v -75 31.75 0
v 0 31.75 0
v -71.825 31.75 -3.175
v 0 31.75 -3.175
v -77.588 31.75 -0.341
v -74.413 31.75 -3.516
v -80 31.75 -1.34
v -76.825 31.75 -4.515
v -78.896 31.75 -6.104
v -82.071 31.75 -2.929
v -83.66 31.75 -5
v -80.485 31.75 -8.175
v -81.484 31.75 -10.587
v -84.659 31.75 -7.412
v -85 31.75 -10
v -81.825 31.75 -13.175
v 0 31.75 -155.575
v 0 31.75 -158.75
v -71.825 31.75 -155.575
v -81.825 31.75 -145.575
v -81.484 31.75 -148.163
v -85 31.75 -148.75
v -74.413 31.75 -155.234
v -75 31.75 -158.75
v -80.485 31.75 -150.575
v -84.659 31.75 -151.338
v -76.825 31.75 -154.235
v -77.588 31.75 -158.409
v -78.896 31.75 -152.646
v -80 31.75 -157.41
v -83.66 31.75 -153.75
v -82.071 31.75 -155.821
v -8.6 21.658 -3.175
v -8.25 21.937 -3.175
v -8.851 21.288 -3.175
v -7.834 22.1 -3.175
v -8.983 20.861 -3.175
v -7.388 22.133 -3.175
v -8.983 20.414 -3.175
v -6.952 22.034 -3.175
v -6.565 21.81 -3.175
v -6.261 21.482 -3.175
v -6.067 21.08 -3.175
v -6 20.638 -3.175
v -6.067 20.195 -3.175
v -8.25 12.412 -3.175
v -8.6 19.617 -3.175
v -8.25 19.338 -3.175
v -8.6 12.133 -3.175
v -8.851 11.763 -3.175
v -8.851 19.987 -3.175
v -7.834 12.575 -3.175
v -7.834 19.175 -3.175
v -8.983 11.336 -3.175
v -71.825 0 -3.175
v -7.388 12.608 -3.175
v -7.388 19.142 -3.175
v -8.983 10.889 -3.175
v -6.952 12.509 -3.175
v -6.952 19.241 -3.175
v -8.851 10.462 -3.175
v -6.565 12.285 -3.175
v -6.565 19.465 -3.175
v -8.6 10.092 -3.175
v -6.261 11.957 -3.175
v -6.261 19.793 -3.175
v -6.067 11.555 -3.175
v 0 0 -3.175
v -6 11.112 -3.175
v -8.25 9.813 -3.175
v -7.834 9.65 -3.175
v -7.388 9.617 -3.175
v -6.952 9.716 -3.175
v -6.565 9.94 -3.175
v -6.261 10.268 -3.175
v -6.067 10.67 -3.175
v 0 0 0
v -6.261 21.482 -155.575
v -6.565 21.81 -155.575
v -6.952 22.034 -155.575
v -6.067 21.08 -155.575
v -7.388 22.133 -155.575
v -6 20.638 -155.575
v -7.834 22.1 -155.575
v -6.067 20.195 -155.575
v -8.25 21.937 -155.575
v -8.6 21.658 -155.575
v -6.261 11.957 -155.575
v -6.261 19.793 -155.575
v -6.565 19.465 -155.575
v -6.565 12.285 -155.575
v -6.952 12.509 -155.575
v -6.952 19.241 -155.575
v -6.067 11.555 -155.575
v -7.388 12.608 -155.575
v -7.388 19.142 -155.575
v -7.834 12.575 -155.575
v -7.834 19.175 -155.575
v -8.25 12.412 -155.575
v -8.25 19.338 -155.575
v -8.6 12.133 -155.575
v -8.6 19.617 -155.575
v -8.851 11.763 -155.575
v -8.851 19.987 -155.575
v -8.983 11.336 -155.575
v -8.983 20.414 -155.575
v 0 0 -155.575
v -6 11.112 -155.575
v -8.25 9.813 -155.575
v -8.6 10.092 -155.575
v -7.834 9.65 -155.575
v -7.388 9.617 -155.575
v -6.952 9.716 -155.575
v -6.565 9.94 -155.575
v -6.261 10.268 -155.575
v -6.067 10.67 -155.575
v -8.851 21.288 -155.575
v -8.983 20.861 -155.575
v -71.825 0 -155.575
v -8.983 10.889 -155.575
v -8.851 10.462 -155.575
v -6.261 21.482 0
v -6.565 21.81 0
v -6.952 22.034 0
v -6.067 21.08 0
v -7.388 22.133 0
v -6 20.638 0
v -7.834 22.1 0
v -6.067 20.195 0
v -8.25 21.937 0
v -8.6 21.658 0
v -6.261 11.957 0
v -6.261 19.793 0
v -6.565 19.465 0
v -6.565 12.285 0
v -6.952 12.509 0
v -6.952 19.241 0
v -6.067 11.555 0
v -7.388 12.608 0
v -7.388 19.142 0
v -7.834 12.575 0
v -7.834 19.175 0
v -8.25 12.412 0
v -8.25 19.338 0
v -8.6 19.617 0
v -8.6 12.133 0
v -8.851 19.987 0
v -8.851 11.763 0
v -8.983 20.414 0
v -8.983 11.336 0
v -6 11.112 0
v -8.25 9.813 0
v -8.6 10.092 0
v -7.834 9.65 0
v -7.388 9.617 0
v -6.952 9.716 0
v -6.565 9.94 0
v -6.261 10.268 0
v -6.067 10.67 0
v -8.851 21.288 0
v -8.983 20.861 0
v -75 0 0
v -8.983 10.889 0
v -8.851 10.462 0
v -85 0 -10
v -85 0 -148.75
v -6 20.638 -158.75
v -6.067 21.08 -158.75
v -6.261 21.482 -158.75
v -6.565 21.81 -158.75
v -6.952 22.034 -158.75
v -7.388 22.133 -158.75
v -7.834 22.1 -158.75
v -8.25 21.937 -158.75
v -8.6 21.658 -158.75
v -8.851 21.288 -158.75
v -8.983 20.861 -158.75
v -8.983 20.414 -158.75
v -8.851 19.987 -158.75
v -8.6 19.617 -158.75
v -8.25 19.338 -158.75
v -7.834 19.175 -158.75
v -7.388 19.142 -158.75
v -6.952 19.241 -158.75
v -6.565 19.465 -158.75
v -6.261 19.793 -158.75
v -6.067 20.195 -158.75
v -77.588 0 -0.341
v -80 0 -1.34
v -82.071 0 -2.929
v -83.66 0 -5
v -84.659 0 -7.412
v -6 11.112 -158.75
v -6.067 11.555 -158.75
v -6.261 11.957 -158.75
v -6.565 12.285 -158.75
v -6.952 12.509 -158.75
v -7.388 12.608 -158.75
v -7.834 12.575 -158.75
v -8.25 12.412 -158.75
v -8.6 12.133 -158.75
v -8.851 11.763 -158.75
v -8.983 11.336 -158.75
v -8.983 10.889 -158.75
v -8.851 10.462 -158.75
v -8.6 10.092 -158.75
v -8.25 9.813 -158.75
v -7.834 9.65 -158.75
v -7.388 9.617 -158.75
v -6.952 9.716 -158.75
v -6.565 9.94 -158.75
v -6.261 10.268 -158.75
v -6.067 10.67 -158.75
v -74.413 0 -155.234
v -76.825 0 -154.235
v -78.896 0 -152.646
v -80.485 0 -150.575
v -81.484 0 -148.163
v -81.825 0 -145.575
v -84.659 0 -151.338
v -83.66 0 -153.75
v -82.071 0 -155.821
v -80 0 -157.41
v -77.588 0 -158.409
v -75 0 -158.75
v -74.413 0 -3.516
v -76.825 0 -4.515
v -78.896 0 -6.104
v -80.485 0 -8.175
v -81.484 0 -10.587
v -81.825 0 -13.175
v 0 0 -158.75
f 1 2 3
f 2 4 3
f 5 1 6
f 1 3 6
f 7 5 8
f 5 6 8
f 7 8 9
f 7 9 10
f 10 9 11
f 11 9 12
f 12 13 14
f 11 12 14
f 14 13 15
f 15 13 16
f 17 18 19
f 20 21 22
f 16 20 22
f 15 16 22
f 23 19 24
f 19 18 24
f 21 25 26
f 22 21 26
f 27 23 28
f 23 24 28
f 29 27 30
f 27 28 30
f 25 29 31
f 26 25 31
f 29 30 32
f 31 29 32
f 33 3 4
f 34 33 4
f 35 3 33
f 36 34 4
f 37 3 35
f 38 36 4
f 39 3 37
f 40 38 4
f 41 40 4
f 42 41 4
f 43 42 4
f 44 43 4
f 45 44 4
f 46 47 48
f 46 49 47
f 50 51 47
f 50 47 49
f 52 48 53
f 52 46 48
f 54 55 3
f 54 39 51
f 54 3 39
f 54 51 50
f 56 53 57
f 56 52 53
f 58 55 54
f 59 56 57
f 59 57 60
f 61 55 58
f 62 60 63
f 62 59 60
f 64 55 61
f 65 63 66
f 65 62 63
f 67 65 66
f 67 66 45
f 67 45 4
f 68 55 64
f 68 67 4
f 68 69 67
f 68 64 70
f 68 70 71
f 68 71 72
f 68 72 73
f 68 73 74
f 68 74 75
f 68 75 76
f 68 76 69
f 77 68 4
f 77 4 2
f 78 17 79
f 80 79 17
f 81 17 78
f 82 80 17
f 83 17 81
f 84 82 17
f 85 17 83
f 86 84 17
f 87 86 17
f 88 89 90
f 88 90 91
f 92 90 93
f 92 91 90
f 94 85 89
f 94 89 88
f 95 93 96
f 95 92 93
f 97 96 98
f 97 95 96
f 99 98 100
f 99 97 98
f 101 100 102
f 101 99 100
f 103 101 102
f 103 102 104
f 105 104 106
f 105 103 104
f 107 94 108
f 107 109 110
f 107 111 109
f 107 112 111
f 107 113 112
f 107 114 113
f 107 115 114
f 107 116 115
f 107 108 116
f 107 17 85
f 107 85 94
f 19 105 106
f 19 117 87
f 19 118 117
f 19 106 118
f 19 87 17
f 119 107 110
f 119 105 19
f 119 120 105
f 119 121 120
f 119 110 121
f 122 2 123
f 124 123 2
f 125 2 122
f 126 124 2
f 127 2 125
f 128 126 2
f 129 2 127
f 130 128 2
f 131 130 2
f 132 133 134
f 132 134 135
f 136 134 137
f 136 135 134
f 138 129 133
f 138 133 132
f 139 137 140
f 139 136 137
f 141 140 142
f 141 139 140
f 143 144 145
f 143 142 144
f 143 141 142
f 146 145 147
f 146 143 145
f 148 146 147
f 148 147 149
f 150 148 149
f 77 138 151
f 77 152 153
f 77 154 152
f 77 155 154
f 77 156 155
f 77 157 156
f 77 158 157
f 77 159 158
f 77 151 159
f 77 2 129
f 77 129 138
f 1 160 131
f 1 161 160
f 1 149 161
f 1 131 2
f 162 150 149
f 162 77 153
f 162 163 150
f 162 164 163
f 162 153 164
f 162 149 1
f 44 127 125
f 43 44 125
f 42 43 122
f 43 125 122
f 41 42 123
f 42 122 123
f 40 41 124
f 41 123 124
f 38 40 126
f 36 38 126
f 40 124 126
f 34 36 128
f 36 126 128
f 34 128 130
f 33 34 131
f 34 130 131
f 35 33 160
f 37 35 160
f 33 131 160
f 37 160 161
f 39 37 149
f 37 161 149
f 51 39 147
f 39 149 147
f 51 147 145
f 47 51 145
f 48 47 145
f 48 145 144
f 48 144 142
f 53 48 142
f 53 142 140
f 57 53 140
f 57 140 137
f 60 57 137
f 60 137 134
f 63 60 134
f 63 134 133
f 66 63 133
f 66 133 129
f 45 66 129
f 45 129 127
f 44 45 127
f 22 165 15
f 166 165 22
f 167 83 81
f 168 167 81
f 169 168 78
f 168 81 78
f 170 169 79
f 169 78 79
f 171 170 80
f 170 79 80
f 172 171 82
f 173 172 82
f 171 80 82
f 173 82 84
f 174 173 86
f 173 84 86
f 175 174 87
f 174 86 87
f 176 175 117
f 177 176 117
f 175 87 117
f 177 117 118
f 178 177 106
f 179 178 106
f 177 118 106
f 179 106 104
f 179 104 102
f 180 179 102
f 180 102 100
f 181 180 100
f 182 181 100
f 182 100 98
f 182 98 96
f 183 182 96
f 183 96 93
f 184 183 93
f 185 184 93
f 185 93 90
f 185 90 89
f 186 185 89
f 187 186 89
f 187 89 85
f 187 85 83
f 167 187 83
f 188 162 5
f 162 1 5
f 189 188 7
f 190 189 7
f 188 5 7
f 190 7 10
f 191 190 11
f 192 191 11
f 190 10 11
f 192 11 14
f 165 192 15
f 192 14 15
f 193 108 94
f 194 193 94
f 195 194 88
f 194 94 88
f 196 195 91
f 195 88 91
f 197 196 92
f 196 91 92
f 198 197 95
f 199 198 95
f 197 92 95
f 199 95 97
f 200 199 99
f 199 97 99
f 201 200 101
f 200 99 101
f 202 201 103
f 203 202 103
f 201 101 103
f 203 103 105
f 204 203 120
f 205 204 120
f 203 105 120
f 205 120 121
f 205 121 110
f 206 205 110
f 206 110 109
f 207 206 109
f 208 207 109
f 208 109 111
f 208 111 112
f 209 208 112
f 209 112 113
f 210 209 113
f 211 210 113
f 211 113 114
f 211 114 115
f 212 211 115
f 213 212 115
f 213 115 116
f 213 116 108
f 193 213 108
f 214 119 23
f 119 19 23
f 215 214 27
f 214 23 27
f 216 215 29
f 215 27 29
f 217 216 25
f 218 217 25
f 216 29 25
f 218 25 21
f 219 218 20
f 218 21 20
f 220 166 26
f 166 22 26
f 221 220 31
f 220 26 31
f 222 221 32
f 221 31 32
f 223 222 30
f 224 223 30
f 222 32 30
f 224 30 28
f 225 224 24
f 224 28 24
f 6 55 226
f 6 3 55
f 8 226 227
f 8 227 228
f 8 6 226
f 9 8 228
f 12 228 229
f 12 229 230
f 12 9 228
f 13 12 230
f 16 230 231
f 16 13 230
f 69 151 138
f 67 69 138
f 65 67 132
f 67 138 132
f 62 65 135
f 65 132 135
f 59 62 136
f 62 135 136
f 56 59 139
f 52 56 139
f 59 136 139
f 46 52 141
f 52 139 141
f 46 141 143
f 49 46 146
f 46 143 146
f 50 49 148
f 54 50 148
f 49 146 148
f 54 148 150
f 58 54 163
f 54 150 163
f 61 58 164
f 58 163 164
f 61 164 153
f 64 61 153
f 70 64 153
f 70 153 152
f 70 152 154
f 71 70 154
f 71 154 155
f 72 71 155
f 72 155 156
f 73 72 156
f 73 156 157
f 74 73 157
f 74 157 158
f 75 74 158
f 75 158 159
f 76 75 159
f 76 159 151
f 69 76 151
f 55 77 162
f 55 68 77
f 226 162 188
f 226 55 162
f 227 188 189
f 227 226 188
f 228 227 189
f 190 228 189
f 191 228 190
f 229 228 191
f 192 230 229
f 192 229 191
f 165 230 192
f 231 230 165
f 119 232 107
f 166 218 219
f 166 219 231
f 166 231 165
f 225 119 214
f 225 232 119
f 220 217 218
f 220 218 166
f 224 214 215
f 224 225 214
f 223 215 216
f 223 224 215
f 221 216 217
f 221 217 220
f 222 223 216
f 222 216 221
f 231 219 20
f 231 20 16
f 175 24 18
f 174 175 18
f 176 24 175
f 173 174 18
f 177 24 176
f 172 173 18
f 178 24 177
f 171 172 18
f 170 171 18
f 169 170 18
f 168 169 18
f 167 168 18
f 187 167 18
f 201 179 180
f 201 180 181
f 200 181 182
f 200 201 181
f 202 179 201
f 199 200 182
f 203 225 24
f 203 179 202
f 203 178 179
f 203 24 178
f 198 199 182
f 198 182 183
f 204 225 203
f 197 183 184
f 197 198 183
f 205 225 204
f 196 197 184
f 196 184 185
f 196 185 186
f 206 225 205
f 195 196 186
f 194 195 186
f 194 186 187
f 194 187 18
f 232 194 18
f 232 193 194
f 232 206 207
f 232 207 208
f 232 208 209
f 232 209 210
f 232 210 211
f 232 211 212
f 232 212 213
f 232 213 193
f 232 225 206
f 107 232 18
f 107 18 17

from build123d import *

# Parameters (mm, degrees)
BOSS_EXTRUDE1_DEPTH = 31.75
SKETCH2_R           = 1.5
CUT_EXTRUDE1_DEPTH  = 183.851374072
FILLET1_R           = 10


with BuildPart() as part:
    # Sketch1 → Boss-Extrude1 (new body)
    with BuildSketch(Plane(origin=(0, 0, 0), x_dir=(1, 0, 0), z_dir=(0, 1, 0))):
        Polygon((0, 0), (-85, 0), (-85, 158.75), (0, 158.75), (0, 155.575), (-81.825, 155.575), (-81.825, 3.175), (0, 3.175), align=None)
    extrude(amount=BOSS_EXTRUDE1_DEPTH)

    # Sketch2 → Cut-Extrude1 (cut, through all)
    with BuildSketch(Plane.XY):
        with Locations((-7.5, 11.1125)):
            Circle(SKETCH2_R)
        with Locations((-7.5, 20.6375)):
            Circle(SKETCH2_R)
    extrude(amount=-CUT_EXTRUDE1_DEPTH, mode=Mode.SUBTRACT)

    # Fillet1
    fillet1_edges = [part.edges().sort_by_distance(p)[0] for p in [
        (-85, 15.875, 0),
        (-85, 15.875, -158.75),
        (-81.825, 15.875, -155.575),
        (-81.825, 15.875, -3.175),
    ]]
    fillet(fillet1_edges, radius=FILLET1_R)


solid = part.part
